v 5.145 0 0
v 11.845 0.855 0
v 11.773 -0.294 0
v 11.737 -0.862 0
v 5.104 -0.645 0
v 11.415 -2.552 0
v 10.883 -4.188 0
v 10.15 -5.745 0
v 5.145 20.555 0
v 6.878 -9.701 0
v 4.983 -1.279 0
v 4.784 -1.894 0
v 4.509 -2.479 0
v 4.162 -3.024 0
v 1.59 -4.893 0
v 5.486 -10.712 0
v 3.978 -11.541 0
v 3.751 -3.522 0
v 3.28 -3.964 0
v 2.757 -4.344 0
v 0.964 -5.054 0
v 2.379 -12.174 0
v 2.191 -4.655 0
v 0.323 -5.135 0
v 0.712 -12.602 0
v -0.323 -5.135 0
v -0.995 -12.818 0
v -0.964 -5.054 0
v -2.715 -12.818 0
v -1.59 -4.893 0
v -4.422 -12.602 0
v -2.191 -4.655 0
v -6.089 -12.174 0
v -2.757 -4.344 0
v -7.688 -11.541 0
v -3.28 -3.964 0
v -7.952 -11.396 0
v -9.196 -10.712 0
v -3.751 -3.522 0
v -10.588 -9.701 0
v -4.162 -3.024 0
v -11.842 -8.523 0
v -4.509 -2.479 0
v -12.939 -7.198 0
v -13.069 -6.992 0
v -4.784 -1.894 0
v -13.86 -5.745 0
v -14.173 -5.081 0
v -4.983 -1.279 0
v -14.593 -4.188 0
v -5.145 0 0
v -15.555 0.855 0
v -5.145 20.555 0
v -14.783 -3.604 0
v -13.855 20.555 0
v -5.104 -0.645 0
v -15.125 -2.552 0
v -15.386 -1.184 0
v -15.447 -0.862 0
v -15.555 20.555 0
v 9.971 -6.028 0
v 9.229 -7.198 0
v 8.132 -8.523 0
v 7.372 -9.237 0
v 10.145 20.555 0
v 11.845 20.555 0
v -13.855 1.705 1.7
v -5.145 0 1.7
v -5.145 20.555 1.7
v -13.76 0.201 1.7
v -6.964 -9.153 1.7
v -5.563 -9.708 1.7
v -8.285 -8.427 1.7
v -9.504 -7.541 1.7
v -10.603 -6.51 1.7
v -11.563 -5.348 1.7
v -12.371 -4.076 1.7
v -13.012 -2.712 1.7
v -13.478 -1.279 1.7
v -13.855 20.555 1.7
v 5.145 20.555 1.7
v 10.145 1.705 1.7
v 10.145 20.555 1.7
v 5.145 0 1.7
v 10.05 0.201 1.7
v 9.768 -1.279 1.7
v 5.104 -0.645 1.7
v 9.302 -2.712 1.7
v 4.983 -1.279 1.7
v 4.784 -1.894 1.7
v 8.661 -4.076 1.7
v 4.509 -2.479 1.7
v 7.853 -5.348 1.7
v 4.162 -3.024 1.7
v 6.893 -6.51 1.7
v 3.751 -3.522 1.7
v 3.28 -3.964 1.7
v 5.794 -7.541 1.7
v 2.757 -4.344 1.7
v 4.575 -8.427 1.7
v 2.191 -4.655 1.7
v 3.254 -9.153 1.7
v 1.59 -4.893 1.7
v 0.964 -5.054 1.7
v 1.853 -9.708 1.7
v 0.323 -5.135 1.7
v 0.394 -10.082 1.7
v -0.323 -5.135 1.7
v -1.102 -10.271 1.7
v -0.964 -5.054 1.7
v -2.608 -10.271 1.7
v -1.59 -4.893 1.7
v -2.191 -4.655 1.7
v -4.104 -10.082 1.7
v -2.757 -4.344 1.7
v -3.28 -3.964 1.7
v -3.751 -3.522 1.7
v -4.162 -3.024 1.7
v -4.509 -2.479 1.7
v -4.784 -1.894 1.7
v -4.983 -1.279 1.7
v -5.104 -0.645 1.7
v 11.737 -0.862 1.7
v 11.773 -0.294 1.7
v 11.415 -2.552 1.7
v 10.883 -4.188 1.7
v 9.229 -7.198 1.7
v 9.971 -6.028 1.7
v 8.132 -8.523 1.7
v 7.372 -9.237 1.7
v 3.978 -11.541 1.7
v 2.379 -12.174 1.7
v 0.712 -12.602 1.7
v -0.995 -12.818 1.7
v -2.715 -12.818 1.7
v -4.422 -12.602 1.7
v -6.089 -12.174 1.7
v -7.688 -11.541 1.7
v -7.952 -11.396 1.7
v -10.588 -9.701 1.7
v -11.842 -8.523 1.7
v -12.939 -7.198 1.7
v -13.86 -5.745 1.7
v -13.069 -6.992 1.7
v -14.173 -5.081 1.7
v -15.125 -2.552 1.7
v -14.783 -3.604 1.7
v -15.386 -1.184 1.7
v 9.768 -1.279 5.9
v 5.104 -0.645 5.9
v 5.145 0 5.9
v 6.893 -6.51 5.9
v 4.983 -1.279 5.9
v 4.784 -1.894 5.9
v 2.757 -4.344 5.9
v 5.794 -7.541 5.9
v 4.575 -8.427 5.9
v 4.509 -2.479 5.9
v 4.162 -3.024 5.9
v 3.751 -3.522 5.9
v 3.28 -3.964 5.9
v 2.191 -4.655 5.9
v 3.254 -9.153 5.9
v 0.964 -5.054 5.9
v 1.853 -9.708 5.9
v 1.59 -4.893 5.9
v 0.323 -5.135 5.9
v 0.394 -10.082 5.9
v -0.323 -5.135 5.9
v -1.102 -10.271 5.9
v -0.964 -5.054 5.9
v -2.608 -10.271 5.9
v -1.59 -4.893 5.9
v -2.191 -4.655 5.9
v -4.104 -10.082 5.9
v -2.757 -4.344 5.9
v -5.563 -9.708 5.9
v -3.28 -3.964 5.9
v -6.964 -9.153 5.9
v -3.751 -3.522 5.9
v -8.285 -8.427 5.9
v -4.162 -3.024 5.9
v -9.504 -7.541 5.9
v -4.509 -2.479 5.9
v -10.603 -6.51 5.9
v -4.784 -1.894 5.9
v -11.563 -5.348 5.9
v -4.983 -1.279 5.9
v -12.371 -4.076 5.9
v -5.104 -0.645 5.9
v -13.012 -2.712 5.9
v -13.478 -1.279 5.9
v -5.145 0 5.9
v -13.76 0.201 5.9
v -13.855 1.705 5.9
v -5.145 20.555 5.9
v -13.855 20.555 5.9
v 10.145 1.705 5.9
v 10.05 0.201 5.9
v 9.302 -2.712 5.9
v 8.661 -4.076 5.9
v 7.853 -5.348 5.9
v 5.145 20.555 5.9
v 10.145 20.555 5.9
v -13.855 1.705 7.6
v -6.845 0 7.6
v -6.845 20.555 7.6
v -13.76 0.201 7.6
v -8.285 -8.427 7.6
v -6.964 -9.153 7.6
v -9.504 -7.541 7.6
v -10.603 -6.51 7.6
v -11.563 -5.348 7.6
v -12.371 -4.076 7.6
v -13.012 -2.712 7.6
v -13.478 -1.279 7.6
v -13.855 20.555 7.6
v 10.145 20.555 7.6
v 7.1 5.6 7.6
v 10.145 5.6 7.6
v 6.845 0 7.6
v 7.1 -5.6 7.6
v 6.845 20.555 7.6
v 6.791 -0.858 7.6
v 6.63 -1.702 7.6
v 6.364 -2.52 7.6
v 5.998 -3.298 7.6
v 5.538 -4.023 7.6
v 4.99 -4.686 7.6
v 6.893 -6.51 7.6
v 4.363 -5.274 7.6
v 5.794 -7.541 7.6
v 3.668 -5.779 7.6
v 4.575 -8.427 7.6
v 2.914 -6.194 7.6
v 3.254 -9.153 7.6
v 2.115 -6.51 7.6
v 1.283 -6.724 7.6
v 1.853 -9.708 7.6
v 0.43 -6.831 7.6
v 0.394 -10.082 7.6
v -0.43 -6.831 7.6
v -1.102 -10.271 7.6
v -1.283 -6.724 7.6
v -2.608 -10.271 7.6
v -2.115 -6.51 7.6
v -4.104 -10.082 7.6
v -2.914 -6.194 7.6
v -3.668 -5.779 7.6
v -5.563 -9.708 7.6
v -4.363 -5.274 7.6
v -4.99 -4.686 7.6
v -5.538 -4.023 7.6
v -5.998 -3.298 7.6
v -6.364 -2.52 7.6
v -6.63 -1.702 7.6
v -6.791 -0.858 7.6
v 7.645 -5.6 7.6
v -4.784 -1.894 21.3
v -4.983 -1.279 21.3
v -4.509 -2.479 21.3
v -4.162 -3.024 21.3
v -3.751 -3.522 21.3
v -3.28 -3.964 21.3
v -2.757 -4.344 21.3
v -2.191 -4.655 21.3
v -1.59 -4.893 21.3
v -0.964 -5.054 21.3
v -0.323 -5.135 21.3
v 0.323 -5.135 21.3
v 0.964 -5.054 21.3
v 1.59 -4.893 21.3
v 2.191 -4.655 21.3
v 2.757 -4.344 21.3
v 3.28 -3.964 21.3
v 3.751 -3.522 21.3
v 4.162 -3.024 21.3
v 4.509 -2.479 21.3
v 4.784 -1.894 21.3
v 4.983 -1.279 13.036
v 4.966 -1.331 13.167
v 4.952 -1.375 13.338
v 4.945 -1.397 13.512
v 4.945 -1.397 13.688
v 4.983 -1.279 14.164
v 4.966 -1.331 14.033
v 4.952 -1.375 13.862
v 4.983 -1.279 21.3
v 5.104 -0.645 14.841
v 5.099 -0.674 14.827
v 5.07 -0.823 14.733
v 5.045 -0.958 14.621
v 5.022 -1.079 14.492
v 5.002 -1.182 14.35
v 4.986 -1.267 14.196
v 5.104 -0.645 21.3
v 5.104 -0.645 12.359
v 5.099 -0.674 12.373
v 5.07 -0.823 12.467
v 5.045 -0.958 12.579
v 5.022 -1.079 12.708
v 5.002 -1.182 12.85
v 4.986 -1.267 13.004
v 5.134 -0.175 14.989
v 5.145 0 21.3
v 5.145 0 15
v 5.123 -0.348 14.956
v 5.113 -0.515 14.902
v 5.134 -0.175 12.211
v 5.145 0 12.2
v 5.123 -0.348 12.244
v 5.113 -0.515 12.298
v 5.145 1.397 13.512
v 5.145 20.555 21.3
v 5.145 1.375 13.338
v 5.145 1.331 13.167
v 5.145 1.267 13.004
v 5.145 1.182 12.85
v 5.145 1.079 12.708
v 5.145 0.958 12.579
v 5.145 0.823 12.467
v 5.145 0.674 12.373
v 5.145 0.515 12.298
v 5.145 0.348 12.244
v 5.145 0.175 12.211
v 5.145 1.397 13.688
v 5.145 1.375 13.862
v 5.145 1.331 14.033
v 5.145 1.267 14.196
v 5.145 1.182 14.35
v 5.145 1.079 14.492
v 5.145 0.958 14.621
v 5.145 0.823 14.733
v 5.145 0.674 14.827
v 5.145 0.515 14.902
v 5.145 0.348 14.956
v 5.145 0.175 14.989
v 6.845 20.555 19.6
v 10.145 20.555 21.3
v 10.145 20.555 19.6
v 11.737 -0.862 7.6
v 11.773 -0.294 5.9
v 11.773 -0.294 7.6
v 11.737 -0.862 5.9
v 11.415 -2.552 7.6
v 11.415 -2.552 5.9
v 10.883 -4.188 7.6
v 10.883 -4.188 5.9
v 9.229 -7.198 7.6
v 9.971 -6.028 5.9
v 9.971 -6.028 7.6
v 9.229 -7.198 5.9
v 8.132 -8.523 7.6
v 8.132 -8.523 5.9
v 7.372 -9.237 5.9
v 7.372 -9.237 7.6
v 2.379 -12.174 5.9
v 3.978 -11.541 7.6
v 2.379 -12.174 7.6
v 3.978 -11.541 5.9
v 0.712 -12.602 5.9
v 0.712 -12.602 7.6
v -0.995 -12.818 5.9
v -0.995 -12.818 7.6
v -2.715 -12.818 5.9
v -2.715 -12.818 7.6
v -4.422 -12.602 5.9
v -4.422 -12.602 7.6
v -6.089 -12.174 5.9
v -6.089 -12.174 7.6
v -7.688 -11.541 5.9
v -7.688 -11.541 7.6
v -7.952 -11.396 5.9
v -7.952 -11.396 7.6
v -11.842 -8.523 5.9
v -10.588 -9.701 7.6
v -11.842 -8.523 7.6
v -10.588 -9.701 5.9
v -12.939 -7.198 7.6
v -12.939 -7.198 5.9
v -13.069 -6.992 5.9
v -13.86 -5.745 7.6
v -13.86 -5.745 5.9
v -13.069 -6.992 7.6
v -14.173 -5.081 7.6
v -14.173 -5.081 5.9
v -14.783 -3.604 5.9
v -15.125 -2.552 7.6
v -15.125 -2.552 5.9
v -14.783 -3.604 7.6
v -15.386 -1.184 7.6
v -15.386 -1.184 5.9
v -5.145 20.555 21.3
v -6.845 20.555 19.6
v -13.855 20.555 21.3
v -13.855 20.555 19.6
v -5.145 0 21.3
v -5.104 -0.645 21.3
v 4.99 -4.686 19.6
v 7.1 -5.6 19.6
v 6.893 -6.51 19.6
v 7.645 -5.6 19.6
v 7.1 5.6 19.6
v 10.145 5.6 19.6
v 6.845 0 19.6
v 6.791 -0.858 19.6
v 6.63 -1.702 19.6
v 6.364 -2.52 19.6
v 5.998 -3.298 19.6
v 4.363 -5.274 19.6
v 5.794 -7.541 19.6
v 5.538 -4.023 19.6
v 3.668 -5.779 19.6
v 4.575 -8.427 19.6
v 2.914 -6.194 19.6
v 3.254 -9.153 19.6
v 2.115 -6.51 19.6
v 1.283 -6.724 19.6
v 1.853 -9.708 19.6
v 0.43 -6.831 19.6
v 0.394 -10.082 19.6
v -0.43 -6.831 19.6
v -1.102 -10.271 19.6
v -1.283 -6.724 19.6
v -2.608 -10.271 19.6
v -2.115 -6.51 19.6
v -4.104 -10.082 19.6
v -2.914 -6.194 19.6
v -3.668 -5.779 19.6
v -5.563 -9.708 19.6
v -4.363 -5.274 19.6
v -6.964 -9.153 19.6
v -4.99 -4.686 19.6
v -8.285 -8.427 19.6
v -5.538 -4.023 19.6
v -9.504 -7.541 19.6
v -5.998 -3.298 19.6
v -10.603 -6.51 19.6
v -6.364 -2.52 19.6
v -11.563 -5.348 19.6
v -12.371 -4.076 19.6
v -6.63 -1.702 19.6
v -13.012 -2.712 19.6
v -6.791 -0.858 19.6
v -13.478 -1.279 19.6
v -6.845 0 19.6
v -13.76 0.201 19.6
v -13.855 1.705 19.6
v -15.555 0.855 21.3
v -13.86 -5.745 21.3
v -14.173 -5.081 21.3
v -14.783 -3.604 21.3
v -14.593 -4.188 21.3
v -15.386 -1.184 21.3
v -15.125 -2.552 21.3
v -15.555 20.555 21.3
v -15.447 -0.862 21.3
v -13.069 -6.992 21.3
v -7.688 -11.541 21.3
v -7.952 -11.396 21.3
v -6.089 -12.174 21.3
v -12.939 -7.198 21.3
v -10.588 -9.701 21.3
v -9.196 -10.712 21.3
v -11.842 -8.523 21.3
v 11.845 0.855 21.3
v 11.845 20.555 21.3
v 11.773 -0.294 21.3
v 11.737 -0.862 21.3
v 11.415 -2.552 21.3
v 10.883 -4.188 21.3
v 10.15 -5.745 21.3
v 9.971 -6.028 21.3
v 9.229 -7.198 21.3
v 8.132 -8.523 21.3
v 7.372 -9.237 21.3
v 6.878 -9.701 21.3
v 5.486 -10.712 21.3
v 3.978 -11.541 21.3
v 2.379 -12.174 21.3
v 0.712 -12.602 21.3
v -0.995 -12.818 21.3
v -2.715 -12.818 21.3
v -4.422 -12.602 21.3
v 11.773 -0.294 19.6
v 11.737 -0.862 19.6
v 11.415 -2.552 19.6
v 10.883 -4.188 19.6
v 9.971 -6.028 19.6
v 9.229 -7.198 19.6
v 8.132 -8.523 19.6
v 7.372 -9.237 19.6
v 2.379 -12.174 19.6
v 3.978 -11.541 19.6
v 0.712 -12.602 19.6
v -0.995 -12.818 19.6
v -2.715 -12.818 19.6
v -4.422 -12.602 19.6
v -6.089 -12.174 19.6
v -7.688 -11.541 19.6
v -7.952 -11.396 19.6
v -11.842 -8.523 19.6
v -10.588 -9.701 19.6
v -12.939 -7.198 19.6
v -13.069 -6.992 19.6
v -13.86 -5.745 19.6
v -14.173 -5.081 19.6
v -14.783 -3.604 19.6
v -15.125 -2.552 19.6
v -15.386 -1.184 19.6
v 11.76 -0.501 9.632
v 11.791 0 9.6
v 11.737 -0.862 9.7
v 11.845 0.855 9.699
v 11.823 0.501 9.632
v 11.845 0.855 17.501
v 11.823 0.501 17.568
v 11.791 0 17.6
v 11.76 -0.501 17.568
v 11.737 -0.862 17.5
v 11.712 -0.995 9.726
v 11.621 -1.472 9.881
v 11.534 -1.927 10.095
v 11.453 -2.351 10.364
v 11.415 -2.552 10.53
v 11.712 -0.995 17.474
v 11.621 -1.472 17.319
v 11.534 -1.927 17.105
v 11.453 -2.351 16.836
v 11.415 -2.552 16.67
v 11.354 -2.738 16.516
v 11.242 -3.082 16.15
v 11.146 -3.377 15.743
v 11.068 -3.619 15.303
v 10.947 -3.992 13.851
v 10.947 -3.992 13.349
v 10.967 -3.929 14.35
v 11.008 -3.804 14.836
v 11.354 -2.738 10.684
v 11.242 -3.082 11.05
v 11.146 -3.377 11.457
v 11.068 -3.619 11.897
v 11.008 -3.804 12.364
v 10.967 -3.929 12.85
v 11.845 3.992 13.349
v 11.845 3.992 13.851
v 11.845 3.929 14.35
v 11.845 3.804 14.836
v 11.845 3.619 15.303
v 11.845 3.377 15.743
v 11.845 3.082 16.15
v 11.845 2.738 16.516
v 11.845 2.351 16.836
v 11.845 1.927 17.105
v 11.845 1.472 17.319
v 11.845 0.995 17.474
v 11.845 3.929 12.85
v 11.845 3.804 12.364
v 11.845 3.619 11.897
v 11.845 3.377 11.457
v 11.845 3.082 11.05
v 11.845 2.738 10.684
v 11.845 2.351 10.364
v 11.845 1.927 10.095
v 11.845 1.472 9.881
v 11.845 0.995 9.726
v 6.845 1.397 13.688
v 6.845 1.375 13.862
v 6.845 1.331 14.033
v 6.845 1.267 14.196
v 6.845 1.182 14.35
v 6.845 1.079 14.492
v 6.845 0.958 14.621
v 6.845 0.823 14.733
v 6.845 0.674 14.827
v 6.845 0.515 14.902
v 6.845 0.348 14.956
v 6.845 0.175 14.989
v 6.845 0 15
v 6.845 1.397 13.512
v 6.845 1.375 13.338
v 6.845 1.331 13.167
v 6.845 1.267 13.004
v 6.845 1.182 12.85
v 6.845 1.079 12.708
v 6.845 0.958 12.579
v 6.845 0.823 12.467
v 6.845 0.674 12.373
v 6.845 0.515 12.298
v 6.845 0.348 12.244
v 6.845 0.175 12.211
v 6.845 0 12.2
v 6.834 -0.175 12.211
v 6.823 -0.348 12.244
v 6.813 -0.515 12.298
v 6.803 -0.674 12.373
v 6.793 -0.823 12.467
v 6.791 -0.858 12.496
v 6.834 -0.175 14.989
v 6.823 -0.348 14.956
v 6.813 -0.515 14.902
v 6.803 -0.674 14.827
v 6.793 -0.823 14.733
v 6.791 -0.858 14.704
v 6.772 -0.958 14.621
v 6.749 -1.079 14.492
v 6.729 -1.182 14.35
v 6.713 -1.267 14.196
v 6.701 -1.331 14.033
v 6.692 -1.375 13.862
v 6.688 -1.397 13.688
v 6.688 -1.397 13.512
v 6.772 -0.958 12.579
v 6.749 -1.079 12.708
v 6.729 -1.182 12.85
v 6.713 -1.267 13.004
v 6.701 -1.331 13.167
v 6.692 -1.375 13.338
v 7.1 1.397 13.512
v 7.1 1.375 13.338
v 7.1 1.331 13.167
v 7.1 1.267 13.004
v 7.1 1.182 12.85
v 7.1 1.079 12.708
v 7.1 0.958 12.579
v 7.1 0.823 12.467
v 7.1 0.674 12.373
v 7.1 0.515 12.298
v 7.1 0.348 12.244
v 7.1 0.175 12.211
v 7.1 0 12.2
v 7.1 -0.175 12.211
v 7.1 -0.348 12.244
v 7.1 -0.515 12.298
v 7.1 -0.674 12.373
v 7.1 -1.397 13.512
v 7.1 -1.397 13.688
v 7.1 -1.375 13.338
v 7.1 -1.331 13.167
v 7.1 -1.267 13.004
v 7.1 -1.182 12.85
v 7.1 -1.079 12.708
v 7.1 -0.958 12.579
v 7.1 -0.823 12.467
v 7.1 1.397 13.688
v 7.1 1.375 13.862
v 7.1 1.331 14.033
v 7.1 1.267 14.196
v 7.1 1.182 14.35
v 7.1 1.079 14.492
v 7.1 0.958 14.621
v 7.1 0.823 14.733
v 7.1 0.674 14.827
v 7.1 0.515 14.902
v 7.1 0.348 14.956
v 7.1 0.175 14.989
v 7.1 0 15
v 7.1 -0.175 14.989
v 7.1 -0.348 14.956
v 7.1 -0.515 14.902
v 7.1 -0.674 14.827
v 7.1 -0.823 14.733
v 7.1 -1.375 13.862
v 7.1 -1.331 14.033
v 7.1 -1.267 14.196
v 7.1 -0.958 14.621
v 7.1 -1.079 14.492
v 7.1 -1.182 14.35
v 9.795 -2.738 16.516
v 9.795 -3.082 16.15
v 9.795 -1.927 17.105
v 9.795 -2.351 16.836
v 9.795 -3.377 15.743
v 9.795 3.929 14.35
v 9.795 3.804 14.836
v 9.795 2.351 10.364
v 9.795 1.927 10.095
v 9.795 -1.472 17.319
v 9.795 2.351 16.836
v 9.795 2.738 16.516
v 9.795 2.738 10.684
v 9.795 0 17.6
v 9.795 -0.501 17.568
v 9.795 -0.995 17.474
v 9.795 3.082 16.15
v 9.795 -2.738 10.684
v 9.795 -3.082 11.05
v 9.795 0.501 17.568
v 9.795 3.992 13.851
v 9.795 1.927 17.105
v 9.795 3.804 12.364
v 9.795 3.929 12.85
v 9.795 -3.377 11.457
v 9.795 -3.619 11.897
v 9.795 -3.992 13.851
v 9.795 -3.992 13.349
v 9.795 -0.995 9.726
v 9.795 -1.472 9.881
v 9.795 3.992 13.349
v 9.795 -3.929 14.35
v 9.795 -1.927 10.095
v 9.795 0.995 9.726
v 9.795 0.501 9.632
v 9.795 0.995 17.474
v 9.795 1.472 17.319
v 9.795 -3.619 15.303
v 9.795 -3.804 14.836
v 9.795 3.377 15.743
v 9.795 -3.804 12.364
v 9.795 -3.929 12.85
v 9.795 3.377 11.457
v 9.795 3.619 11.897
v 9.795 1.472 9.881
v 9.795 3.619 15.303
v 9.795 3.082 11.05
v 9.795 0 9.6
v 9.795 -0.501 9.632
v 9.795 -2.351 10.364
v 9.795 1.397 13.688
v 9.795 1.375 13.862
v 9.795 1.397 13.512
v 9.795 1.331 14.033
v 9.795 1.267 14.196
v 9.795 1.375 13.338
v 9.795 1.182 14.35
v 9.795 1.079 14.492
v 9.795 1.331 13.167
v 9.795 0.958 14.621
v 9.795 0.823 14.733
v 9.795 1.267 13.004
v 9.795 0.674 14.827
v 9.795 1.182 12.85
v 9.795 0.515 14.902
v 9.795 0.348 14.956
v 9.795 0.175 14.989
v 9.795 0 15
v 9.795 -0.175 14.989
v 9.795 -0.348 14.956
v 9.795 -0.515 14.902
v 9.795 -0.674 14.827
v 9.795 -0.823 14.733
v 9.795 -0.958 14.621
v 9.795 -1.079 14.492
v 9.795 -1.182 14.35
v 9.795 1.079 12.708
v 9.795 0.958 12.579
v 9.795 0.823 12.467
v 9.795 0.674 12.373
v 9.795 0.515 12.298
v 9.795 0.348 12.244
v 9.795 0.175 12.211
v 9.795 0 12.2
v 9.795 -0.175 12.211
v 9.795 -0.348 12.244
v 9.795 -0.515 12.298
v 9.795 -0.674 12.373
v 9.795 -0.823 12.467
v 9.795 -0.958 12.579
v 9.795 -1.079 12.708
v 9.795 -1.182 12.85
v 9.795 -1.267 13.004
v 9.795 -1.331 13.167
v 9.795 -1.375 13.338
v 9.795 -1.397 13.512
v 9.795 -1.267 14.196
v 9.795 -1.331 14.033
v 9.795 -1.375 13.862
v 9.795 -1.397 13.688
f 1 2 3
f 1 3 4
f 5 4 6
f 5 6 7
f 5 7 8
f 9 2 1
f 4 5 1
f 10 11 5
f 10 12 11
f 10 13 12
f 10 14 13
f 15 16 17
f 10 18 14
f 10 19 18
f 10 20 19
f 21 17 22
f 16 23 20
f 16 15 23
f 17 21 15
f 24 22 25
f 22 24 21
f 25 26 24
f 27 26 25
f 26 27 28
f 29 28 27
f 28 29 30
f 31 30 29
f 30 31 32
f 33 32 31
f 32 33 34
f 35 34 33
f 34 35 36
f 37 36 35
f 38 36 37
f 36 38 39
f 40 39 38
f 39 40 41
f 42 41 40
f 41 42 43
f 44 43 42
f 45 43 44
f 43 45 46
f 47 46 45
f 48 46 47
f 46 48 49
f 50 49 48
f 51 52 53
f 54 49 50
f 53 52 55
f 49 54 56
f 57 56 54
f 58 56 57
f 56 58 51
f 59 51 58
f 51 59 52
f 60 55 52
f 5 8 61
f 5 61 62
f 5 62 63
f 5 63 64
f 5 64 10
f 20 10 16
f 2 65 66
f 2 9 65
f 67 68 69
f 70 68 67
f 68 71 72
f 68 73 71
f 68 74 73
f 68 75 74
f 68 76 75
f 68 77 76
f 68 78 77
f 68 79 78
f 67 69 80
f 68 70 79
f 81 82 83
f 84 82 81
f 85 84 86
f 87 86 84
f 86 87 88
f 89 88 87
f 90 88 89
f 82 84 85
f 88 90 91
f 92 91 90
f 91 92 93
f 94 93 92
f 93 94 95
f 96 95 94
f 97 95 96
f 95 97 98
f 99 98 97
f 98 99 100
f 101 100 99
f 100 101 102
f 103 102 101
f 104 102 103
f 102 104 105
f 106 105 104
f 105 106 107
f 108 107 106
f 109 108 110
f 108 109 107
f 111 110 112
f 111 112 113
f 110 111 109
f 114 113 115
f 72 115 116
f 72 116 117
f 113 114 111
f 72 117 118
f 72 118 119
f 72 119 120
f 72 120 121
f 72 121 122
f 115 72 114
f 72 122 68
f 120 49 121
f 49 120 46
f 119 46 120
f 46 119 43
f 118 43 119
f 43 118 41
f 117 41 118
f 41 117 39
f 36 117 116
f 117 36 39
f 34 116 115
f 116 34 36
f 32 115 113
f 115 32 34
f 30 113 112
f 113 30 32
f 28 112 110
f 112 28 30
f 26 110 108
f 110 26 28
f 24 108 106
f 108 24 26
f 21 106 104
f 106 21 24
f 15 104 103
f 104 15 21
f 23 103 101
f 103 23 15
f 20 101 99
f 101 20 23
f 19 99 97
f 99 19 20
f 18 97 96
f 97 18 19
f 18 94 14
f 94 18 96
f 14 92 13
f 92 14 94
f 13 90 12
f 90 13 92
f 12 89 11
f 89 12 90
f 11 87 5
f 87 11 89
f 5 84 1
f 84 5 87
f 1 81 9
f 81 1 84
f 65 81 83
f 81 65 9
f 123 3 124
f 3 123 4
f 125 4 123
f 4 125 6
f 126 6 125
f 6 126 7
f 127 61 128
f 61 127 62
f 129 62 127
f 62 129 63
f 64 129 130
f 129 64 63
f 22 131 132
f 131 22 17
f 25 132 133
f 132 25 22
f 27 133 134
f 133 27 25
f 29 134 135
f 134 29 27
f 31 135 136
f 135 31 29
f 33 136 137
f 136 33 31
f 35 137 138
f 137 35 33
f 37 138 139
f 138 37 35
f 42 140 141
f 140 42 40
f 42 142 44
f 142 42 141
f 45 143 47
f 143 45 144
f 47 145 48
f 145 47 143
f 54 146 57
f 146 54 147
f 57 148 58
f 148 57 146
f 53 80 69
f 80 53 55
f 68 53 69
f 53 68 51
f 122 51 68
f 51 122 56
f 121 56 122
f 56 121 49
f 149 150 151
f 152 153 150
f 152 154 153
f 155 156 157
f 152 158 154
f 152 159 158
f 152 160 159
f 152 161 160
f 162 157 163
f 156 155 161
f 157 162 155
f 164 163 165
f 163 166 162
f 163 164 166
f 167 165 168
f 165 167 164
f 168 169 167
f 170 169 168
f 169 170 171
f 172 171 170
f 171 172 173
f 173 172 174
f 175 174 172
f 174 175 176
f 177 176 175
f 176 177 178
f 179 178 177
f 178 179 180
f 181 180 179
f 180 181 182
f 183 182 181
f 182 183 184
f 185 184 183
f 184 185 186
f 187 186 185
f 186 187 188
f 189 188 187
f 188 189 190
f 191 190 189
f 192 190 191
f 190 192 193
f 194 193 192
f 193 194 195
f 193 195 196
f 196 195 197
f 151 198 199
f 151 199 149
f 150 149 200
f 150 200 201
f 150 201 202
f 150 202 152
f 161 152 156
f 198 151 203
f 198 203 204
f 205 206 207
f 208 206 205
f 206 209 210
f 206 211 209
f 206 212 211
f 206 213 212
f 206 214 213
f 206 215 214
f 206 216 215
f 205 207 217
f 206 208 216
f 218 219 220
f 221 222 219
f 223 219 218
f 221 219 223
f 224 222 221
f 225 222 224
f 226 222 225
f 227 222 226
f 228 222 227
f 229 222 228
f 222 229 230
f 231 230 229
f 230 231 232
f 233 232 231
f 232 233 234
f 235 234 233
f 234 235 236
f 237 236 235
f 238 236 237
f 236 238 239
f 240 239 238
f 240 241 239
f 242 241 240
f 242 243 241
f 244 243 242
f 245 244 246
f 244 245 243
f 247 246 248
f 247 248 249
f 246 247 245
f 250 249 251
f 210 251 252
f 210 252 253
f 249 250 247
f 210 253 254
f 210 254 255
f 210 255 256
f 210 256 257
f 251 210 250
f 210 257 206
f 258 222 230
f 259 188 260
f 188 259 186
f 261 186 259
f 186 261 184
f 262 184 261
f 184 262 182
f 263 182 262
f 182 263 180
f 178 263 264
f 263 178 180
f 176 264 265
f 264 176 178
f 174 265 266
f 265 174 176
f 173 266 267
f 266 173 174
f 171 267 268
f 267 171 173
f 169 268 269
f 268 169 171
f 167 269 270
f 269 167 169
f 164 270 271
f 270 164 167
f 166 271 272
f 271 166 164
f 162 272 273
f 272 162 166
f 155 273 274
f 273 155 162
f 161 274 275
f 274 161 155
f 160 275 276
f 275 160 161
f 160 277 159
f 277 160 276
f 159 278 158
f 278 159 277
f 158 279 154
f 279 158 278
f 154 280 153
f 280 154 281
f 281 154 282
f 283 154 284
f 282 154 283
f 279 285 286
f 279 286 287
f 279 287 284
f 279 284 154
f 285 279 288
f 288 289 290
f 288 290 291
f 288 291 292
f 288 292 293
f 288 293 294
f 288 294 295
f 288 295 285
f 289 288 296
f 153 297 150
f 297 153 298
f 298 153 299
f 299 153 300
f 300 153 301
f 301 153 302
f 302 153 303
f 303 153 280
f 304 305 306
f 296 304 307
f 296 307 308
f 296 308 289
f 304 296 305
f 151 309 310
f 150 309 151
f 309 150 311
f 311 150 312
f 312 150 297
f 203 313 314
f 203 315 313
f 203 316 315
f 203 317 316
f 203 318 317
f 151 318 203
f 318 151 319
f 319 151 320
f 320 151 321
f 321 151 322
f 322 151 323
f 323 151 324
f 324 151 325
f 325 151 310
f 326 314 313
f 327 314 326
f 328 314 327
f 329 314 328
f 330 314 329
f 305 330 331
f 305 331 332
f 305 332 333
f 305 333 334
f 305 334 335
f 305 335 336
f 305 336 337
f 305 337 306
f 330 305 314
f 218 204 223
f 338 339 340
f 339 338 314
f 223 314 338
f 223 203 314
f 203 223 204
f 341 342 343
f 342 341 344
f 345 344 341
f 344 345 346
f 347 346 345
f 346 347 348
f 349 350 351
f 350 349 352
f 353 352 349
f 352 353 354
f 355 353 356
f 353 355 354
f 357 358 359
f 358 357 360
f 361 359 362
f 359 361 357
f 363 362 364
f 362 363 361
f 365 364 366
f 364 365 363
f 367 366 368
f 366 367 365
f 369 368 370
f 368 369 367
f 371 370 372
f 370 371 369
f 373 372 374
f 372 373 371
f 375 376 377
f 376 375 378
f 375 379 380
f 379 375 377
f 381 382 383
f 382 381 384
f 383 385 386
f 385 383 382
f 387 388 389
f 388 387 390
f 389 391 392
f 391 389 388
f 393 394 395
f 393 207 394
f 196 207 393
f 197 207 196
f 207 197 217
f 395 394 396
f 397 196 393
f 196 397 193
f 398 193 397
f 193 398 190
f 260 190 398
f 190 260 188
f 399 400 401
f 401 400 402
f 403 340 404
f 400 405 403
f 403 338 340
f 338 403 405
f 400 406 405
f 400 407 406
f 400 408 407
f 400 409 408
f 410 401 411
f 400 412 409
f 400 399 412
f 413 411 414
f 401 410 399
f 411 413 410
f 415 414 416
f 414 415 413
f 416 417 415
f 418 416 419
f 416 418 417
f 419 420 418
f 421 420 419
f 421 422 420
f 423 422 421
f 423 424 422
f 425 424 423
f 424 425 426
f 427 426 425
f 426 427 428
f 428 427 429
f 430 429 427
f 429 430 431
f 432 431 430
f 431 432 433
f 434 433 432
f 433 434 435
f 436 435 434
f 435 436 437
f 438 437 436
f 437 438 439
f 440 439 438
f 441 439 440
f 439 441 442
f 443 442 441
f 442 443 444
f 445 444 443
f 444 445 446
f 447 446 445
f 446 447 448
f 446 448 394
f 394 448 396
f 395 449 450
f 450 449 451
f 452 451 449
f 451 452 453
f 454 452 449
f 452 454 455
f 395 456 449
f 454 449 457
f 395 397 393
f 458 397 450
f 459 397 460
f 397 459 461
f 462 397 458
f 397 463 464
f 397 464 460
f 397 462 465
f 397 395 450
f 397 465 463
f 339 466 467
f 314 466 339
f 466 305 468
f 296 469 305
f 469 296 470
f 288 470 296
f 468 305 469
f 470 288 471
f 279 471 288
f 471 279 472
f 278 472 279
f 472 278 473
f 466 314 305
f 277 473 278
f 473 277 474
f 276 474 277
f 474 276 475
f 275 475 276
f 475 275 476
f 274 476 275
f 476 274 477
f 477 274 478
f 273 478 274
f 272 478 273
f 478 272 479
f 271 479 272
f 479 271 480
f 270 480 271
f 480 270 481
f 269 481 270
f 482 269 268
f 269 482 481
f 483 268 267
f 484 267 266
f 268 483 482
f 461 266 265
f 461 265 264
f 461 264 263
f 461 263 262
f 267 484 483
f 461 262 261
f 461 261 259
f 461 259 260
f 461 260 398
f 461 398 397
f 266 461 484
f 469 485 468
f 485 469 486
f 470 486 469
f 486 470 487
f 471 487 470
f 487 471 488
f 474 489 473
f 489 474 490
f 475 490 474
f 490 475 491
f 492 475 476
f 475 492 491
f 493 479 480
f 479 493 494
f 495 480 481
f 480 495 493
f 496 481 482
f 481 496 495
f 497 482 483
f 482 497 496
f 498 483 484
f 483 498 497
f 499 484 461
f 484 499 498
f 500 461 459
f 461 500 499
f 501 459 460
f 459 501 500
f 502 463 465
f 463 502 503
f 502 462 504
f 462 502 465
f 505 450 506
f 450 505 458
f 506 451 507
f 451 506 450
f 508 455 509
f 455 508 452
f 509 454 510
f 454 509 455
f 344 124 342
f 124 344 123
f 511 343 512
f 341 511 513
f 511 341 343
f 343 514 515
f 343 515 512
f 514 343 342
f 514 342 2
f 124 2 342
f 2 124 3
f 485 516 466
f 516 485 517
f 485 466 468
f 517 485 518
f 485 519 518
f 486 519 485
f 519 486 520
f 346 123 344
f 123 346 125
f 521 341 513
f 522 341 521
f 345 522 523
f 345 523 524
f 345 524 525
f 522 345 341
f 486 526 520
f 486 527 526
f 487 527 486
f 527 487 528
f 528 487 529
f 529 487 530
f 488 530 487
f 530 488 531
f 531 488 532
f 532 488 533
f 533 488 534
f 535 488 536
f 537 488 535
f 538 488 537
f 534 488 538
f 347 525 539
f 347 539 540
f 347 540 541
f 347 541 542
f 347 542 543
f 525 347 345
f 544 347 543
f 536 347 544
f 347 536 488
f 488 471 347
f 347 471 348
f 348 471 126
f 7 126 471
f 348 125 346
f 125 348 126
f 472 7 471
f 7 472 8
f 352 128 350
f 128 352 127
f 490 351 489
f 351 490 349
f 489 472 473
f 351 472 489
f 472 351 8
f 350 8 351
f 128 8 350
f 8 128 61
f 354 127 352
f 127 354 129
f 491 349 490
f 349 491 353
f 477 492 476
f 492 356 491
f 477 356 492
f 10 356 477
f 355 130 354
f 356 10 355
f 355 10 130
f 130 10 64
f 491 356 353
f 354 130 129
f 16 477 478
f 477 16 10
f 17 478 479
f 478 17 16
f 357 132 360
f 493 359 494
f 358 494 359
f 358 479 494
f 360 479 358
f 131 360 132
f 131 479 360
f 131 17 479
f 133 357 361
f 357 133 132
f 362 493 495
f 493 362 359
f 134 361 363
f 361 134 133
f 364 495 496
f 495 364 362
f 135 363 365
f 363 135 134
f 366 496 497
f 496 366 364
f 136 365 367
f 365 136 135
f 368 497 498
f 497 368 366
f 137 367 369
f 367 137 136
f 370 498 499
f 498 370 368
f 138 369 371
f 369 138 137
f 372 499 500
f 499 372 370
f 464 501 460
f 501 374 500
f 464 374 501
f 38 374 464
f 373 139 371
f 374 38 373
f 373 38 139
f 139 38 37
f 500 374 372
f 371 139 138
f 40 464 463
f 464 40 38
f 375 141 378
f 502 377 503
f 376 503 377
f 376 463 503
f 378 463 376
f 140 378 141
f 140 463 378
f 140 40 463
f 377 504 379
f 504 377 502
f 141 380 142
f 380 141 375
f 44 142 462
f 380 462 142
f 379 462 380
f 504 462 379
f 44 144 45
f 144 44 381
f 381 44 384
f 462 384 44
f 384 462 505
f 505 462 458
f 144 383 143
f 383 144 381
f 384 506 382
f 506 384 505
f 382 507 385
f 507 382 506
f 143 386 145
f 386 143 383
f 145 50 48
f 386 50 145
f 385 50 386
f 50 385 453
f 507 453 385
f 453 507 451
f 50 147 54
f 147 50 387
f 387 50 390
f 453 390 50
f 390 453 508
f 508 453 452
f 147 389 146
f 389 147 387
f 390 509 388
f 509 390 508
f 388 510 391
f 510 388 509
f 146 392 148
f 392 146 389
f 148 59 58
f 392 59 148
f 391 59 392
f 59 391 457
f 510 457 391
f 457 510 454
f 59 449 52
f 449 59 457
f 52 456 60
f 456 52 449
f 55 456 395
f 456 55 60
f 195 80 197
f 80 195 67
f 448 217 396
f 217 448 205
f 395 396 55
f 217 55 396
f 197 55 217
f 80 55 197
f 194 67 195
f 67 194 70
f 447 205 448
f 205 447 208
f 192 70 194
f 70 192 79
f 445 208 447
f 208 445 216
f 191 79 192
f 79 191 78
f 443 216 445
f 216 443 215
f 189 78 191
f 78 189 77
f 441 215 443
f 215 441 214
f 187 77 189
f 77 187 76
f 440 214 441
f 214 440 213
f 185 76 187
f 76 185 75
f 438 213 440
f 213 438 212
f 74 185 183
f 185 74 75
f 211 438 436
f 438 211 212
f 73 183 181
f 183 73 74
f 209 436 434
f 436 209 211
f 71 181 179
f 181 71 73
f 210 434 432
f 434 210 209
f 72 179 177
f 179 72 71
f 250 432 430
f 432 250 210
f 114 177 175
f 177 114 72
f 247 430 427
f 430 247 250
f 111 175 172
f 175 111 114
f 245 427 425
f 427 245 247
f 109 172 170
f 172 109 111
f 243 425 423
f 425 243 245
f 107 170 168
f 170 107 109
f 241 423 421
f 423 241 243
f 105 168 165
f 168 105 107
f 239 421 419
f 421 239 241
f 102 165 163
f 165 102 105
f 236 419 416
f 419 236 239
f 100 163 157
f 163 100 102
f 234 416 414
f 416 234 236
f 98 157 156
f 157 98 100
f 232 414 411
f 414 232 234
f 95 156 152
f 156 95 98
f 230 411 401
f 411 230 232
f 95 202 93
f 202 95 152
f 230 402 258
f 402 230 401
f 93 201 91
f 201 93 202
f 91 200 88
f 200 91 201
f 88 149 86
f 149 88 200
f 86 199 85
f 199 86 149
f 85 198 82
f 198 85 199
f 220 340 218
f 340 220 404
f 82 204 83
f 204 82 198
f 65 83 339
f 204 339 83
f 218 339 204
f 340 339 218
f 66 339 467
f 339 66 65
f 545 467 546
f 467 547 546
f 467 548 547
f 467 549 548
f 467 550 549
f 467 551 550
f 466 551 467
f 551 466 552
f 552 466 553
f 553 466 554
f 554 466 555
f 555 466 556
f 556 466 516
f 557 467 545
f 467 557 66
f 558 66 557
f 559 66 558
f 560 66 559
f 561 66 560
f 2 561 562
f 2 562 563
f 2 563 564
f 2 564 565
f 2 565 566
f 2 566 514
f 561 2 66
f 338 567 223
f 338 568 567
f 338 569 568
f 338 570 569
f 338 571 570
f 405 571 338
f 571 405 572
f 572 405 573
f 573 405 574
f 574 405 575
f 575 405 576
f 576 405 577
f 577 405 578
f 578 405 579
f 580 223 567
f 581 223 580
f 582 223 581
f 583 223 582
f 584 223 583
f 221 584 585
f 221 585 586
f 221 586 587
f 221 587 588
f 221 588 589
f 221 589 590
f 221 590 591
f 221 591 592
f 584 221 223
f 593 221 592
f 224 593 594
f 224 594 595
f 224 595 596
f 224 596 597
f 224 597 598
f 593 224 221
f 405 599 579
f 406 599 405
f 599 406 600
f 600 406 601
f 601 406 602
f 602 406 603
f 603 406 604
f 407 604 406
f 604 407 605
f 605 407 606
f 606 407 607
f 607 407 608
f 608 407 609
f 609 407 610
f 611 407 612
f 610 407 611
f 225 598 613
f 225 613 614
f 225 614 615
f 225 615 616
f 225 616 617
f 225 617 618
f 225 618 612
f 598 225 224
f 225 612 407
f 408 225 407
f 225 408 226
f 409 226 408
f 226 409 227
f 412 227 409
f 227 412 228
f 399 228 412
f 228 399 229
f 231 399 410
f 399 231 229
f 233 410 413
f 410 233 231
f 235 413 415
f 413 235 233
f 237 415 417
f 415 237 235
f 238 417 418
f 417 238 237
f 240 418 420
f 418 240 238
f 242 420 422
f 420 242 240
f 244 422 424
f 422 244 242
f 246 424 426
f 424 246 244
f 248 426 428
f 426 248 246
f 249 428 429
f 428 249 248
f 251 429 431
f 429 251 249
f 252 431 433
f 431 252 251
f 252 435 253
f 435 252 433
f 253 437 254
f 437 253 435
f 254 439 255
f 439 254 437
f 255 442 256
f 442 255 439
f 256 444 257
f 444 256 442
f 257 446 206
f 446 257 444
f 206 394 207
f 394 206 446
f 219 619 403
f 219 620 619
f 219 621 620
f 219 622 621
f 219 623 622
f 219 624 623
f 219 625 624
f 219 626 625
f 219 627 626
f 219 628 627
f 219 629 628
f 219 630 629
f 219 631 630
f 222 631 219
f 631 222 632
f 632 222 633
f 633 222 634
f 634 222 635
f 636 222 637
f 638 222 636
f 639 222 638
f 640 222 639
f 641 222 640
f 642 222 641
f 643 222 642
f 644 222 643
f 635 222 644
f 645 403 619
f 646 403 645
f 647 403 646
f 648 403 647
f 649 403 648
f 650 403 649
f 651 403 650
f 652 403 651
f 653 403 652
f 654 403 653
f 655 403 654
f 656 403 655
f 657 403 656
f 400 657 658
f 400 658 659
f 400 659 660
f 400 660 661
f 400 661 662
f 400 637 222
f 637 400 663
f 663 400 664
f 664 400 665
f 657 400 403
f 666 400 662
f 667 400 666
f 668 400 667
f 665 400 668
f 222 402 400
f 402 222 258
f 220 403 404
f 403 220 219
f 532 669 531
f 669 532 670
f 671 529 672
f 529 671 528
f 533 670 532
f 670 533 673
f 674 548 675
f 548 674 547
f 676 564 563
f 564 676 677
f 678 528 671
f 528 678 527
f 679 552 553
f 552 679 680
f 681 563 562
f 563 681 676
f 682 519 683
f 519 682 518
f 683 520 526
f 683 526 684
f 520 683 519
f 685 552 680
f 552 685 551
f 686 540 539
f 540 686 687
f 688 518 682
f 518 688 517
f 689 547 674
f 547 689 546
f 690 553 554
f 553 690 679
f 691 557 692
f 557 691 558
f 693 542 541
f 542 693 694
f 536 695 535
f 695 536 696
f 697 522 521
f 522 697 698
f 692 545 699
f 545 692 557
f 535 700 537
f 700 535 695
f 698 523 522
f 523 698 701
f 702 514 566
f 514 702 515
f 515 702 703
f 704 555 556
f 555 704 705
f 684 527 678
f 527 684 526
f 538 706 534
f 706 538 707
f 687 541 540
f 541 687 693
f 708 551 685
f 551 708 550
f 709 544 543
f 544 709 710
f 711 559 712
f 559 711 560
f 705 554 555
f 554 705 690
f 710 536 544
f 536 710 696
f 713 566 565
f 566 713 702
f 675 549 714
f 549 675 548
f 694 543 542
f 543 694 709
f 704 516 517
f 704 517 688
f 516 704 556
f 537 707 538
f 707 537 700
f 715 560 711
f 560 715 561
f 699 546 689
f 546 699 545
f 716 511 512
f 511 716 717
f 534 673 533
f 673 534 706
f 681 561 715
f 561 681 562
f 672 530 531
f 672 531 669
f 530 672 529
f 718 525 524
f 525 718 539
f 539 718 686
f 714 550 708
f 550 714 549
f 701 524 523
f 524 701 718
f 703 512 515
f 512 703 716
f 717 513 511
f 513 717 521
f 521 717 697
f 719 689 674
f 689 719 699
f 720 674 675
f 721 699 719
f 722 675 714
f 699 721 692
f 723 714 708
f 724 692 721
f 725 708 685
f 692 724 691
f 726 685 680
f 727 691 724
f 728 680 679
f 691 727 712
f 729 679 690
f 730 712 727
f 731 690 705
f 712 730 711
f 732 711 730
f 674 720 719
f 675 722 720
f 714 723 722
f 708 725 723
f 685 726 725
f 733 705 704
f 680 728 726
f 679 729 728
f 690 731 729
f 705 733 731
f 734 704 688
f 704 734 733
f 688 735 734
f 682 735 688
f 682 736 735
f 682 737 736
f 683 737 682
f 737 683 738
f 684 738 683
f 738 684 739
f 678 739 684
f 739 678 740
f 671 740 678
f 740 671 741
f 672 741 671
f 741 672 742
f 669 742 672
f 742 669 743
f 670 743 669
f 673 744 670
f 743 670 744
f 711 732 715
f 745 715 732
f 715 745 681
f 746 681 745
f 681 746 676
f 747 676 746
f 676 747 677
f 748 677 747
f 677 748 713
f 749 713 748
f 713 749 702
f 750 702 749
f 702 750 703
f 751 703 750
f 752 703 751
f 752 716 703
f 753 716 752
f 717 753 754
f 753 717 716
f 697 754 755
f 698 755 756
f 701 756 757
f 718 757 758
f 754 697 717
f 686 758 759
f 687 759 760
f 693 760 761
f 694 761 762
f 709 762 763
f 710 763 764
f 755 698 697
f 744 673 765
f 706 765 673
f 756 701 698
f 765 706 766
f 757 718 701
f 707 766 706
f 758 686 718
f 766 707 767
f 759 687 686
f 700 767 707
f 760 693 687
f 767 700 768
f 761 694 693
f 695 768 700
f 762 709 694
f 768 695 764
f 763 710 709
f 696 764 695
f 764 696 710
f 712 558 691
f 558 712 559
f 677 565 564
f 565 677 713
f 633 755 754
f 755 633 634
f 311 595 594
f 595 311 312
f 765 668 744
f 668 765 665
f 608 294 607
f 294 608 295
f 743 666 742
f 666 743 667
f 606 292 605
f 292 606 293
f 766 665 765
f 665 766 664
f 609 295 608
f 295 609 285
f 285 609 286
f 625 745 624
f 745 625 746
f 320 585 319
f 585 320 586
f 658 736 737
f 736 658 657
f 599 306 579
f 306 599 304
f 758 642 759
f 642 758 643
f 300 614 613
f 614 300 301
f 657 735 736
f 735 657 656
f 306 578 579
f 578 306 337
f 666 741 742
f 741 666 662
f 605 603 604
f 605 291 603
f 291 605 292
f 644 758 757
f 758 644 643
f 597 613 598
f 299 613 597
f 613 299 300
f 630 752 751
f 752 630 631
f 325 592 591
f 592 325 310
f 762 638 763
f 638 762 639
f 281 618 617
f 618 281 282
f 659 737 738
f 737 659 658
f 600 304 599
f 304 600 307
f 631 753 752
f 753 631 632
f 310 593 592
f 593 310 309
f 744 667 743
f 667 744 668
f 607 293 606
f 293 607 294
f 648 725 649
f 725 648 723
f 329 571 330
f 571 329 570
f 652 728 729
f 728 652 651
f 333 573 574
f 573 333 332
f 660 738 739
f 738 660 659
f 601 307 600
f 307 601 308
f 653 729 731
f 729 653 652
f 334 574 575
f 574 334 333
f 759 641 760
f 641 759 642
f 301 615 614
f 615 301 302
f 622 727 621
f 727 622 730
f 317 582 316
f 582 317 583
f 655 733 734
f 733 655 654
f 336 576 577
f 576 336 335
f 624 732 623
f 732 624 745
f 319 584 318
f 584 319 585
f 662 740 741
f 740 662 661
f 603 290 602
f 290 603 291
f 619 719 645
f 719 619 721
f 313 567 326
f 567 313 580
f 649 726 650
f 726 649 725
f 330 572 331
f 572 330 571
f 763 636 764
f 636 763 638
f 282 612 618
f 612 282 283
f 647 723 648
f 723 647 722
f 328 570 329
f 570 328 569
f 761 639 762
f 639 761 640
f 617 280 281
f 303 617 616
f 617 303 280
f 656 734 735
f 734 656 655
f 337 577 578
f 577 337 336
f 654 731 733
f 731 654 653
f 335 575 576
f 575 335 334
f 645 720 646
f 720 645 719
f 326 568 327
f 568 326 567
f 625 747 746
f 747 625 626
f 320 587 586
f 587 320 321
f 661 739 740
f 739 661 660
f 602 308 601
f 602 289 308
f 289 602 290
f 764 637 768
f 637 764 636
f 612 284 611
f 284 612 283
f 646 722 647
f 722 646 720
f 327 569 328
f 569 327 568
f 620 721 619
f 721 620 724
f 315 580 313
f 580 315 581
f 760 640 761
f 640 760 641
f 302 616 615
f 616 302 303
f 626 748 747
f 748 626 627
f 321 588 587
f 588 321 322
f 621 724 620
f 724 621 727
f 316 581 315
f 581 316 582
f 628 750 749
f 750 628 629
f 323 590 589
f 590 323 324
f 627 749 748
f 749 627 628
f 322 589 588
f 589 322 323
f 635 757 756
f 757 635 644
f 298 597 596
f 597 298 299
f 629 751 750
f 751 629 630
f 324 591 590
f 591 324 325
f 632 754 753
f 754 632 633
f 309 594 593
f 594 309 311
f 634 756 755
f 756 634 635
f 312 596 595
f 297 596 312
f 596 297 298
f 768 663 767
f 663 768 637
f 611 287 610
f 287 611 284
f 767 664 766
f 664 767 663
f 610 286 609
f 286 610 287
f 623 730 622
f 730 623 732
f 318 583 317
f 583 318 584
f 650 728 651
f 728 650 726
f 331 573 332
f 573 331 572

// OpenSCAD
// file: ../../lib/rounded_square.scad
$fn = 50;

// ------------------------------------------------------------
// Helper functions
// ------------------------------------------------------------

function normalize_radius(radius) = is_list(radius)
                                        ? radius
                                        : [ radius, radius, radius, radius ];

// ------------------------------------------------------------
// Rounded Square
// ------------------------------------------------------------
//
// Uses 4 corners and a hull() to connect them to a rectangle.
// Rounded corners are circles while straight corners are squares.
//
// Arguments:
//
// - size: [x, y]
// - radius: r or [r_top_left, r_top_right, r_bottom_right, r_bottom_left]
//
module rounded_square(size, radius) {
  radius = normalize_radius(radius);
  assert(len(radius) == 4,
         "Invalid radius value, must be either single value or array of 4");

  max_radius = min(size.x / 2, size.y / 2);

  r_top_left = min(radius[0], max_radius);
  r_top_right = min(radius[1], max_radius);
  r_bottom_right = min(radius[2], max_radius);
  r_bottom_left = min(radius[3], max_radius);

  hull() {
    if (r_top_left == 0) {
      translate([ -size.x / 2, size.y / 2 - 1 ]) square([ 1, 1 ]);
    } else {
      x = -size.x / 2 + r_top_left;
      y = size.y / 2 - r_top_left;
      translate([ x, y ]) circle(r = r_top_left);
    }

    if (r_top_right == 0) {
      translate([ size.x / 2 - 1, size.y / 2 - 1 ]) square([ 1, 1 ]);
    } else {
      x = size.x / 2 - r_top_right;
      y = size.y / 2 - r_top_right;
      translate([ x, y ]) circle(r = r_top_right);
    }

    if (r_bottom_right == 0) {
      translate([ size.x / 2 - 1, -size.y / 2 ]) square([ 1, 1 ]);
    } else {
      x = size.x / 2 - r_bottom_right;
      y = -size.y / 2 + r_bottom_right;
      translate([ x, y ]) circle(r = r_bottom_right);
    }

    if (r_bottom_left == 0) {
      translate([ -size.x / 2, -size.y / 2 ]) square([ 1, 1 ]);
    } else {
      x = -size.x / 2 + r_bottom_left;
      y = -size.y / 2 + r_bottom_left;
      translate([ x, y ]) circle(r = r_bottom_left);
    }
  }
}

// ------------------------------------------------------------
// Rounded Shell
// ------------------------------------------------------------
//
// Arguments:
//
// - size: [x, y]
// - thickness
// - outer_radius: r or [r_top_left, r_top_right, r_bottom_right, r_bottom_left]
// - inner_radius: optional, if missing will revert to inner_radius
//
module rounded_shell(size, thickness, outer_radius, inner_radius) {
  inner_radius = is_undef(inner_radius) ? outer_radius : inner_radius;
  inner_size = [ size.x - thickness * 2, size.y - thickness * 2 ];

  difference() {
    rounded_square(size, outer_radius);
    rounded_square(inner_size, inner_radius);
  }
}

// ------------------------------------------------------------
// Test
// ------------------------------------------------------------

// rounded_square([ 40, 20 ], radius = 3);
// rounded_square([ 40, 20 ], radius = [ 10, 3, 3, 10 ]);
// rounded_square([ 40, 20 ], radius = [ 10, 3, 10, 0 ]);
rounded_shell([ 40, 20 ], thickness = 2, outer_radius = [ 3, 3, 0, 3 ],
              inner_radius = [ 5, 5, 0, 5 ]);
// main file
$fn = 50;

use <../../lib/rounded_square.scad>

module panel(size, pole_diameter, offset) {
  difference() {
    translate(offset) rounded_square(size, [ size.x / 2, size.x / 2, 0, 0 ]);
    circle(d = pole_diameter);
    translate([ 0, -size.y / 2 ]) square([ pole_diameter, size.y ], center = true);
  }
}

module outer_wall(size, offset, wall_width) {
  inner_size = [ size.x - wall_width * 2, size.y - wall_width ];

  translate(offset) difference() {
    rounded_square(size, [ size.x / 2, size.x / 2, 0, 0 ]);

    translate([ 0, -wall_width ])
        rounded_square(inner_size, [ inner_size.x / 2, inner_size.x / 2, 0, 0 ]);
  }
}

module inner_wall(size, offset, pole_diameter, wall_width) {
  outer_size = [ pole_diameter + wall_width * 2, size.y / 2 - offset.y ];
  inner_size = [ pole_diameter, size.y / 2 - offset.y ];

  difference() {
    union() {
      circle(d = outer_size.x);
      translate([ 0, -outer_size.y / 2 ]) square(outer_size, center = true);
    }

    union() {
      circle(d = inner_size.x);
      translate([ 0, -inner_size.y / 2 ]) square(inner_size, center = true);
    }
  }
}

module curtain_hook_cover(hook_size, pole_diameter, pole_dist, wall_width) {
  outer_size = [ hook_size.x + wall_width * 2, hook_size.y + wall_width * 2 ];
  offset = [
    pole_diameter / 2 - outer_size.x / 2 + wall_width + pole_dist.x,
    pole_diameter / 2 - outer_size.y / 2 + wall_width + pole_dist.y,
  ];

  screw_head_diameter = 8;
  screw_head_height = 2.1;
  tightener_height = screw_head_diameter * 1.5;

  difference() {
    union() {
      // Bottom panel
      linear_extrude(wall_width) panel(outer_size, pole_diameter, offset);

      // Middle panel
      mid_panel_z = hook_size.z + wall_width;
      translate([ 0, 0, mid_panel_z ]) linear_extrude(wall_width)
          panel(outer_size, pole_diameter, offset);

      // Top panel
      top_panel_z = mid_panel_z + wall_width + tightener_height;
      translate([ 0, 0, top_panel_z ]) linear_extrude(wall_width)
          panel(outer_size, pole_diameter, offset);

      // Outer wall
      linear_extrude(top_panel_z + wall_width) outer_wall(outer_size, offset, wall_width);

      // Inner wall
      translate([ 0, 0, mid_panel_z + wall_width ]) linear_extrude(tightener_height)
          inner_wall(outer_size, offset, pole_diameter, wall_width);

      // Screw support
      screw_support_size = [
        // x:
        pole_dist.x - wall_width + 0.1,
        // y:
        screw_head_diameter * 1.4,
      ];
      screw_support_offset = [
        // x:
        hook_size.x / 2 - screw_support_size.x - wall_width + 0.2,
        // y:
        -screw_support_size.y / 2
      ];
      translate([ 0, 0, hook_size.z + wall_width * 2 ]) linear_extrude(tightener_height)
          intersection() {
        panel(outer_size, pole_diameter, offset);
        translate(screw_support_offset) square(screw_support_size);
      }
    }

    screw_offset = [
      // x:
      outer_size.y / 2 + offset.y - screw_head_height / 2 + 0.1,
      // y:
      0,
      // z:
      tightener_height / 2 + 2 * wall_width + hook_size.z
    ];

    translate(screw_offset) rotate([ 0, -90, 0 ]) screw(screw_head_height, screw_head_diameter);
  }
}

module screw(head_height = 2.1, head_diameter = 8, screw_diameter = 2.8, screw_height = 5.8) {
  cylinder(d = head_diameter, h = head_height);
  translate([ 0, 0, head_height ]) cylinder(d = screw_diameter, h = screw_height);
}

// Mark 3
mirror([ 0, 1, 0 ]) curtain_hook_cover(hook_size = [ 24, 30, 4.2 ], pole_diameter = 10.29,
                                       pole_dist = [ 5, 6 ], wall_width = 1.7);
